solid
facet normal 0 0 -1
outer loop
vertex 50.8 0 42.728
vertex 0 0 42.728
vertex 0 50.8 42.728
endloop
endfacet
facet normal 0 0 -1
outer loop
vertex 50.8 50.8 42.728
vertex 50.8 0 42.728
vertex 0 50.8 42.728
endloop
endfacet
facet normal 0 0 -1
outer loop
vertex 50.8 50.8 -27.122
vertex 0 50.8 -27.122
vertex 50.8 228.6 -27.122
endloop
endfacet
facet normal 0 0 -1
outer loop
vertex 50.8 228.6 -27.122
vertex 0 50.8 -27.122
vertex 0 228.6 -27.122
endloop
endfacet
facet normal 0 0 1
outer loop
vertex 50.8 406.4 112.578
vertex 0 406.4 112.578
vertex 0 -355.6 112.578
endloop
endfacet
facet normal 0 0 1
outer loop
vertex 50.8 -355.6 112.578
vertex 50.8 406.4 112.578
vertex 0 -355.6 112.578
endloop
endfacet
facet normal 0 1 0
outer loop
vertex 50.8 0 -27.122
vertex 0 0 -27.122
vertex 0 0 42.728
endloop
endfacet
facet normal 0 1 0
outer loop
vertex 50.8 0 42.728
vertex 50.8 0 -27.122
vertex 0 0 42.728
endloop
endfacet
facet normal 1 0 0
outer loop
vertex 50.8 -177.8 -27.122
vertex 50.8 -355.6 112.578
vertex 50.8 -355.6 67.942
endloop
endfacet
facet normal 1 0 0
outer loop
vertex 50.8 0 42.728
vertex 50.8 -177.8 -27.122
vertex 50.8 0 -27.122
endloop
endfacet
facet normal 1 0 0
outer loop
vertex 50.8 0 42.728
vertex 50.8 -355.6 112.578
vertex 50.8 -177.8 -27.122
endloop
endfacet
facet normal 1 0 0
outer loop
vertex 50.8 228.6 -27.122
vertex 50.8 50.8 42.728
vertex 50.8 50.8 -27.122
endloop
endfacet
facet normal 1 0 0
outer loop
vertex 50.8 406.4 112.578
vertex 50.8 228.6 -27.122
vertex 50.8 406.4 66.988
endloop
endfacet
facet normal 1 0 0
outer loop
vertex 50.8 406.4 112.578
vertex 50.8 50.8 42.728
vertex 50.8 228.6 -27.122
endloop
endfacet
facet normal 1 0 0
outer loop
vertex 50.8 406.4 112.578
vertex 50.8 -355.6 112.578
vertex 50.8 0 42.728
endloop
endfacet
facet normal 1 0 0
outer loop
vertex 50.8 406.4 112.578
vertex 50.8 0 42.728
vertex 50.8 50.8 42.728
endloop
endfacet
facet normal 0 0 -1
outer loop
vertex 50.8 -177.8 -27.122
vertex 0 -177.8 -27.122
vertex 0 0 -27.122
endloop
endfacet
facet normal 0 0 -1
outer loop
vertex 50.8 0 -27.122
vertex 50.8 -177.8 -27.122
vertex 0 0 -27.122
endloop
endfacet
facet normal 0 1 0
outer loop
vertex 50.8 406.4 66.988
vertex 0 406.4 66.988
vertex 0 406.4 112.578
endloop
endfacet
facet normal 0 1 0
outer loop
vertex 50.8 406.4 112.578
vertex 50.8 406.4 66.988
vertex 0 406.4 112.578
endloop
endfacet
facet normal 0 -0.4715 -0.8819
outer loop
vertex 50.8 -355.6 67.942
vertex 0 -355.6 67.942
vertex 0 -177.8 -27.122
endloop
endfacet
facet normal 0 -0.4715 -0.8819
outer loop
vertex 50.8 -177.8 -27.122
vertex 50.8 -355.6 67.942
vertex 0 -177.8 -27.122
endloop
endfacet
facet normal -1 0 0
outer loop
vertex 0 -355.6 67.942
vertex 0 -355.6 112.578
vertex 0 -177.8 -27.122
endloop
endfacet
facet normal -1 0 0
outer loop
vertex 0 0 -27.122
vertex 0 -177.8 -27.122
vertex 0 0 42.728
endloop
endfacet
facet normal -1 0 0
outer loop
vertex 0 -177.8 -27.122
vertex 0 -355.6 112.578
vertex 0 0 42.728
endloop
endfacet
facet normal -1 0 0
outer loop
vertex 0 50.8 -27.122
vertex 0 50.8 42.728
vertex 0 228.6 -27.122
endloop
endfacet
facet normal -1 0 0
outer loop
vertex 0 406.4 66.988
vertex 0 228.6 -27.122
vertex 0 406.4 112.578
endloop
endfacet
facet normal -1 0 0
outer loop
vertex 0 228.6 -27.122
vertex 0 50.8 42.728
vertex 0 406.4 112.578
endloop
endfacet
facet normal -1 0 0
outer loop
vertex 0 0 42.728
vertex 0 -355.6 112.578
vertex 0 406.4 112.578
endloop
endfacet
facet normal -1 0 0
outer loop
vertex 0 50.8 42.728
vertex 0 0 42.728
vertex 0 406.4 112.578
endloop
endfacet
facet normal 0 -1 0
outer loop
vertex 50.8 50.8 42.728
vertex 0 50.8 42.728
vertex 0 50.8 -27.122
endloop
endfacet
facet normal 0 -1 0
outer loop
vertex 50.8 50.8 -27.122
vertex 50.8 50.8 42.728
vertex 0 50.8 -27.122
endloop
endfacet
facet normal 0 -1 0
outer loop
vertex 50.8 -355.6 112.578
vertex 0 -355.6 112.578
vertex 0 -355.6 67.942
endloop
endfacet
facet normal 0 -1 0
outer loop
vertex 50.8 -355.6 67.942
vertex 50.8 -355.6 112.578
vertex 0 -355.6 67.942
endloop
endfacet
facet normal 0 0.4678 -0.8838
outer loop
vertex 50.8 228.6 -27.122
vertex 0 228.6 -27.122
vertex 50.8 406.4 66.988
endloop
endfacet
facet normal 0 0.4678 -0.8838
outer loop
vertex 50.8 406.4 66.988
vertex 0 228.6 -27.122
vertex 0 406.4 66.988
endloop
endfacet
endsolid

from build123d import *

# Parameters (mm, degrees)
F0_W     = 50.8
F0_H     = 69.85
F1_DEPTH = 50.8


with BuildPart() as f1:
    # F0 (on Right) → F1 (new body)
    with BuildSketch(Plane.YZ):
        Polygon((-177.8, -27.121778), (0, -27.121778), (0, 42.728222), (0, 112.578222), (-355.6, 112.578222), (-355.6, 67.942142), align=None)
        with Locations((25.4, 77.653222)):
            Rectangle(F0_W, F0_H)
        Polygon((50.8, 112.578222), (50.8, 42.728222), (50.8, -27.121778), (228.6, -27.121778), (406.4, 66.987783), (406.4, 112.578222), align=None)
    extrude(amount=F1_DEPTH)


solid = f1.part
